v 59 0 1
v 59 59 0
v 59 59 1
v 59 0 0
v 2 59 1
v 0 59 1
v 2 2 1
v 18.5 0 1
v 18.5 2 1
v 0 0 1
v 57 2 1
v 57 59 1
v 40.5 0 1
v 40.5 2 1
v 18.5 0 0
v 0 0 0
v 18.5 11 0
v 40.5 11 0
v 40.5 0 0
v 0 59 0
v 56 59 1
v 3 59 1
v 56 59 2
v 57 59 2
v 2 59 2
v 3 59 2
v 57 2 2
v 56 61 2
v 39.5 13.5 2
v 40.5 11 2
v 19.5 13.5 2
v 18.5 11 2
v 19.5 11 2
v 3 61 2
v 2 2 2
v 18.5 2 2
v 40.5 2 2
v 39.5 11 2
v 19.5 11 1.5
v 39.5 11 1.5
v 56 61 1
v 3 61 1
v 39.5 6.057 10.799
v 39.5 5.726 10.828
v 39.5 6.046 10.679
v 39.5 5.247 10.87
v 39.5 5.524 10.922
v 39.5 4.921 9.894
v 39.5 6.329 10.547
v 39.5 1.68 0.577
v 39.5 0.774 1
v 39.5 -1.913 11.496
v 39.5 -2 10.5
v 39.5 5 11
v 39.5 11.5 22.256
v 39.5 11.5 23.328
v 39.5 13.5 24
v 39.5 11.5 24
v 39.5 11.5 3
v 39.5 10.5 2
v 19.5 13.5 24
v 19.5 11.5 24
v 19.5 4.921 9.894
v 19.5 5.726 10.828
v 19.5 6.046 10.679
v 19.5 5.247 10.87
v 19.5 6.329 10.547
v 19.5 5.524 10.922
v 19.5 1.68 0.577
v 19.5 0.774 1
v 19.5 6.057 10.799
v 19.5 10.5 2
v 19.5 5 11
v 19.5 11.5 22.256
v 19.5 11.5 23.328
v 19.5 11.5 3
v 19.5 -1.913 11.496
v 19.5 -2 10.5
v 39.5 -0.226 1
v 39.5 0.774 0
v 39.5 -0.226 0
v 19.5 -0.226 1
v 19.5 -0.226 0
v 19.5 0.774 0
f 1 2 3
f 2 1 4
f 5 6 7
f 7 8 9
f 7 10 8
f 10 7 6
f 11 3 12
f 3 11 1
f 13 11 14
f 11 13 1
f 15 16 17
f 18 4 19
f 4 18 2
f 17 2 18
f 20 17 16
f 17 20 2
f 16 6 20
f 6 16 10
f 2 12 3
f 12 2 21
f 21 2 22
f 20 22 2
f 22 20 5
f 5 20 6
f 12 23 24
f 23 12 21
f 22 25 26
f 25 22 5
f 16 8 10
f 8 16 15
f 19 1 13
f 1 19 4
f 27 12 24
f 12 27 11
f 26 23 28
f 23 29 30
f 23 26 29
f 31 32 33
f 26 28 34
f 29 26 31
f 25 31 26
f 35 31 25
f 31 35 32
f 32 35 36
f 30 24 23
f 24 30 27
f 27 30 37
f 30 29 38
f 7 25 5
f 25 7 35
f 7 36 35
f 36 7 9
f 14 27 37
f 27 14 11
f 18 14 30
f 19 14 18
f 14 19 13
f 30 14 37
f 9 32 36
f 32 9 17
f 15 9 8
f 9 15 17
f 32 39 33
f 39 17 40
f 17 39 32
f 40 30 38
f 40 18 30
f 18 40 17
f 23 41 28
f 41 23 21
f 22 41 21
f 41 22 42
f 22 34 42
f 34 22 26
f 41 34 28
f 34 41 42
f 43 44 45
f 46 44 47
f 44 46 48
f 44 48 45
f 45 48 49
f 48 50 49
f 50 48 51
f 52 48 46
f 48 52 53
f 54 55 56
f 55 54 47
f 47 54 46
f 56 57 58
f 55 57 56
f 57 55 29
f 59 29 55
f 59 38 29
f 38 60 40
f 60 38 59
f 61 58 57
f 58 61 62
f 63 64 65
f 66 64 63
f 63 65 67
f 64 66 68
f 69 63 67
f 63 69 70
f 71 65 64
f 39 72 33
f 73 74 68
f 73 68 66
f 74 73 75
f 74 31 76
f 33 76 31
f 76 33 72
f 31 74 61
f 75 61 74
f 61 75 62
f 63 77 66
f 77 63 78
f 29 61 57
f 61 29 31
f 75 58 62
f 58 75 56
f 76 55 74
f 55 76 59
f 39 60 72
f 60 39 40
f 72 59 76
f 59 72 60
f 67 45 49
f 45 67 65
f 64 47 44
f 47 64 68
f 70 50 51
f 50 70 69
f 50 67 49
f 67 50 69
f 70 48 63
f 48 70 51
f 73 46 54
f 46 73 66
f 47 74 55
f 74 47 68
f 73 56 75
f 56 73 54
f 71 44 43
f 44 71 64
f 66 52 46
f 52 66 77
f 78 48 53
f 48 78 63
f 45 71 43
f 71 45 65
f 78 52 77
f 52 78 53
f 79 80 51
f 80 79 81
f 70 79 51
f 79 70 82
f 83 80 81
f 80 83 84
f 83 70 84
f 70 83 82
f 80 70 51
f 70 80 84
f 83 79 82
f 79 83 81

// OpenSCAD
// Speak&Spell Battery Lid
// 2012-12-26 Bernhard Slawik (http://www.bernhardslawik.de)
EPS = 0.005;
thick = 1.0;
space = 1.0;

lidWidth = 59.0;
lidLength = 59.0;
lidRecess = 2.0;	// Recess of lid borders on upper layer
lidOver = 2.0;	// How far the lid s under the chassis

fixPress = 6;
fixWidth = 20.0;
fixToothHeight = 10.0;
fixHeight = fixToothHeight +14.0;	// From bottom to "tooth" inside chassis
fixDepth = 2.5;	// Height of "tooth"
fixRecess = 5;
fixThick = 0.5;	// Thickness of flexible stuff
fixToothThick = fixRecess + 1.0;
fixToothOver = 1.0;
angle=25;
module lid() {
	difference() {
		union() {
			// Main layers
			cube([lidWidth, lidLength, thick]);

			translate([lidRecess, lidRecess, thick])
			cube([lidWidth - 2*lidRecess, lidLength - 1*lidRecess, thick]);
		}

		// Fixer
		translate([lidWidth/2 - fixWidth/2 - space, -EPS, -EPS])
		cube([fixWidth + 2*space, fixRecess + fixPress + EPS, thick*2 + 2*EPS]);
	}

	// Back hanger
	//@TODO: Slant it for easier printing
	translate([lidRecess + space, lidLength - EPS, thick])
	cube([lidWidth - 2*lidRecess - 2*space, lidOver + EPS, thick]);
	

	// Fixer
	translate([lidWidth/2 - fixWidth/2, fixRecess + fixThick + fixPress, 0])
	cube([fixWidth, thick*2, fixHeight]);

	translate([lidWidth/2 - fixWidth/2, fixRecess + fixThick + fixPress - thick*1, thick*2])
	rotate([-45,0,0])
	cube([fixWidth, thick*2, thick*2]);


	translate([lidWidth/2 - fixWidth/2, fixRecess - sin(angle)*fixToothHeight, space])
	rotate([-angle,0,0])
	cube([fixWidth, thick, fixToothHeight + space]);

	translate([lidWidth/2 - fixWidth/2, fixRecess, fixToothHeight+space])
	rotate([-27.8,0,0])
	cube([fixWidth, fixThick, fixHeight - fixToothHeight]);

	// Anti-tooth
	translate([lidWidth/2 - fixWidth/2, fixRecess - fixToothThick - fixToothOver, fixToothHeight + space/2])
	rotate([-5.0, 0, 0])
	cube([fixWidth, fixToothThick + thick + fixToothOver, thick]);

	// Finger thinger
	translate([lidWidth/2 - fixWidth/2, fixRecess - sin(angle)*fixToothHeight - thick, 0])
	cube([fixWidth, thick,thick]);



}

lid();
